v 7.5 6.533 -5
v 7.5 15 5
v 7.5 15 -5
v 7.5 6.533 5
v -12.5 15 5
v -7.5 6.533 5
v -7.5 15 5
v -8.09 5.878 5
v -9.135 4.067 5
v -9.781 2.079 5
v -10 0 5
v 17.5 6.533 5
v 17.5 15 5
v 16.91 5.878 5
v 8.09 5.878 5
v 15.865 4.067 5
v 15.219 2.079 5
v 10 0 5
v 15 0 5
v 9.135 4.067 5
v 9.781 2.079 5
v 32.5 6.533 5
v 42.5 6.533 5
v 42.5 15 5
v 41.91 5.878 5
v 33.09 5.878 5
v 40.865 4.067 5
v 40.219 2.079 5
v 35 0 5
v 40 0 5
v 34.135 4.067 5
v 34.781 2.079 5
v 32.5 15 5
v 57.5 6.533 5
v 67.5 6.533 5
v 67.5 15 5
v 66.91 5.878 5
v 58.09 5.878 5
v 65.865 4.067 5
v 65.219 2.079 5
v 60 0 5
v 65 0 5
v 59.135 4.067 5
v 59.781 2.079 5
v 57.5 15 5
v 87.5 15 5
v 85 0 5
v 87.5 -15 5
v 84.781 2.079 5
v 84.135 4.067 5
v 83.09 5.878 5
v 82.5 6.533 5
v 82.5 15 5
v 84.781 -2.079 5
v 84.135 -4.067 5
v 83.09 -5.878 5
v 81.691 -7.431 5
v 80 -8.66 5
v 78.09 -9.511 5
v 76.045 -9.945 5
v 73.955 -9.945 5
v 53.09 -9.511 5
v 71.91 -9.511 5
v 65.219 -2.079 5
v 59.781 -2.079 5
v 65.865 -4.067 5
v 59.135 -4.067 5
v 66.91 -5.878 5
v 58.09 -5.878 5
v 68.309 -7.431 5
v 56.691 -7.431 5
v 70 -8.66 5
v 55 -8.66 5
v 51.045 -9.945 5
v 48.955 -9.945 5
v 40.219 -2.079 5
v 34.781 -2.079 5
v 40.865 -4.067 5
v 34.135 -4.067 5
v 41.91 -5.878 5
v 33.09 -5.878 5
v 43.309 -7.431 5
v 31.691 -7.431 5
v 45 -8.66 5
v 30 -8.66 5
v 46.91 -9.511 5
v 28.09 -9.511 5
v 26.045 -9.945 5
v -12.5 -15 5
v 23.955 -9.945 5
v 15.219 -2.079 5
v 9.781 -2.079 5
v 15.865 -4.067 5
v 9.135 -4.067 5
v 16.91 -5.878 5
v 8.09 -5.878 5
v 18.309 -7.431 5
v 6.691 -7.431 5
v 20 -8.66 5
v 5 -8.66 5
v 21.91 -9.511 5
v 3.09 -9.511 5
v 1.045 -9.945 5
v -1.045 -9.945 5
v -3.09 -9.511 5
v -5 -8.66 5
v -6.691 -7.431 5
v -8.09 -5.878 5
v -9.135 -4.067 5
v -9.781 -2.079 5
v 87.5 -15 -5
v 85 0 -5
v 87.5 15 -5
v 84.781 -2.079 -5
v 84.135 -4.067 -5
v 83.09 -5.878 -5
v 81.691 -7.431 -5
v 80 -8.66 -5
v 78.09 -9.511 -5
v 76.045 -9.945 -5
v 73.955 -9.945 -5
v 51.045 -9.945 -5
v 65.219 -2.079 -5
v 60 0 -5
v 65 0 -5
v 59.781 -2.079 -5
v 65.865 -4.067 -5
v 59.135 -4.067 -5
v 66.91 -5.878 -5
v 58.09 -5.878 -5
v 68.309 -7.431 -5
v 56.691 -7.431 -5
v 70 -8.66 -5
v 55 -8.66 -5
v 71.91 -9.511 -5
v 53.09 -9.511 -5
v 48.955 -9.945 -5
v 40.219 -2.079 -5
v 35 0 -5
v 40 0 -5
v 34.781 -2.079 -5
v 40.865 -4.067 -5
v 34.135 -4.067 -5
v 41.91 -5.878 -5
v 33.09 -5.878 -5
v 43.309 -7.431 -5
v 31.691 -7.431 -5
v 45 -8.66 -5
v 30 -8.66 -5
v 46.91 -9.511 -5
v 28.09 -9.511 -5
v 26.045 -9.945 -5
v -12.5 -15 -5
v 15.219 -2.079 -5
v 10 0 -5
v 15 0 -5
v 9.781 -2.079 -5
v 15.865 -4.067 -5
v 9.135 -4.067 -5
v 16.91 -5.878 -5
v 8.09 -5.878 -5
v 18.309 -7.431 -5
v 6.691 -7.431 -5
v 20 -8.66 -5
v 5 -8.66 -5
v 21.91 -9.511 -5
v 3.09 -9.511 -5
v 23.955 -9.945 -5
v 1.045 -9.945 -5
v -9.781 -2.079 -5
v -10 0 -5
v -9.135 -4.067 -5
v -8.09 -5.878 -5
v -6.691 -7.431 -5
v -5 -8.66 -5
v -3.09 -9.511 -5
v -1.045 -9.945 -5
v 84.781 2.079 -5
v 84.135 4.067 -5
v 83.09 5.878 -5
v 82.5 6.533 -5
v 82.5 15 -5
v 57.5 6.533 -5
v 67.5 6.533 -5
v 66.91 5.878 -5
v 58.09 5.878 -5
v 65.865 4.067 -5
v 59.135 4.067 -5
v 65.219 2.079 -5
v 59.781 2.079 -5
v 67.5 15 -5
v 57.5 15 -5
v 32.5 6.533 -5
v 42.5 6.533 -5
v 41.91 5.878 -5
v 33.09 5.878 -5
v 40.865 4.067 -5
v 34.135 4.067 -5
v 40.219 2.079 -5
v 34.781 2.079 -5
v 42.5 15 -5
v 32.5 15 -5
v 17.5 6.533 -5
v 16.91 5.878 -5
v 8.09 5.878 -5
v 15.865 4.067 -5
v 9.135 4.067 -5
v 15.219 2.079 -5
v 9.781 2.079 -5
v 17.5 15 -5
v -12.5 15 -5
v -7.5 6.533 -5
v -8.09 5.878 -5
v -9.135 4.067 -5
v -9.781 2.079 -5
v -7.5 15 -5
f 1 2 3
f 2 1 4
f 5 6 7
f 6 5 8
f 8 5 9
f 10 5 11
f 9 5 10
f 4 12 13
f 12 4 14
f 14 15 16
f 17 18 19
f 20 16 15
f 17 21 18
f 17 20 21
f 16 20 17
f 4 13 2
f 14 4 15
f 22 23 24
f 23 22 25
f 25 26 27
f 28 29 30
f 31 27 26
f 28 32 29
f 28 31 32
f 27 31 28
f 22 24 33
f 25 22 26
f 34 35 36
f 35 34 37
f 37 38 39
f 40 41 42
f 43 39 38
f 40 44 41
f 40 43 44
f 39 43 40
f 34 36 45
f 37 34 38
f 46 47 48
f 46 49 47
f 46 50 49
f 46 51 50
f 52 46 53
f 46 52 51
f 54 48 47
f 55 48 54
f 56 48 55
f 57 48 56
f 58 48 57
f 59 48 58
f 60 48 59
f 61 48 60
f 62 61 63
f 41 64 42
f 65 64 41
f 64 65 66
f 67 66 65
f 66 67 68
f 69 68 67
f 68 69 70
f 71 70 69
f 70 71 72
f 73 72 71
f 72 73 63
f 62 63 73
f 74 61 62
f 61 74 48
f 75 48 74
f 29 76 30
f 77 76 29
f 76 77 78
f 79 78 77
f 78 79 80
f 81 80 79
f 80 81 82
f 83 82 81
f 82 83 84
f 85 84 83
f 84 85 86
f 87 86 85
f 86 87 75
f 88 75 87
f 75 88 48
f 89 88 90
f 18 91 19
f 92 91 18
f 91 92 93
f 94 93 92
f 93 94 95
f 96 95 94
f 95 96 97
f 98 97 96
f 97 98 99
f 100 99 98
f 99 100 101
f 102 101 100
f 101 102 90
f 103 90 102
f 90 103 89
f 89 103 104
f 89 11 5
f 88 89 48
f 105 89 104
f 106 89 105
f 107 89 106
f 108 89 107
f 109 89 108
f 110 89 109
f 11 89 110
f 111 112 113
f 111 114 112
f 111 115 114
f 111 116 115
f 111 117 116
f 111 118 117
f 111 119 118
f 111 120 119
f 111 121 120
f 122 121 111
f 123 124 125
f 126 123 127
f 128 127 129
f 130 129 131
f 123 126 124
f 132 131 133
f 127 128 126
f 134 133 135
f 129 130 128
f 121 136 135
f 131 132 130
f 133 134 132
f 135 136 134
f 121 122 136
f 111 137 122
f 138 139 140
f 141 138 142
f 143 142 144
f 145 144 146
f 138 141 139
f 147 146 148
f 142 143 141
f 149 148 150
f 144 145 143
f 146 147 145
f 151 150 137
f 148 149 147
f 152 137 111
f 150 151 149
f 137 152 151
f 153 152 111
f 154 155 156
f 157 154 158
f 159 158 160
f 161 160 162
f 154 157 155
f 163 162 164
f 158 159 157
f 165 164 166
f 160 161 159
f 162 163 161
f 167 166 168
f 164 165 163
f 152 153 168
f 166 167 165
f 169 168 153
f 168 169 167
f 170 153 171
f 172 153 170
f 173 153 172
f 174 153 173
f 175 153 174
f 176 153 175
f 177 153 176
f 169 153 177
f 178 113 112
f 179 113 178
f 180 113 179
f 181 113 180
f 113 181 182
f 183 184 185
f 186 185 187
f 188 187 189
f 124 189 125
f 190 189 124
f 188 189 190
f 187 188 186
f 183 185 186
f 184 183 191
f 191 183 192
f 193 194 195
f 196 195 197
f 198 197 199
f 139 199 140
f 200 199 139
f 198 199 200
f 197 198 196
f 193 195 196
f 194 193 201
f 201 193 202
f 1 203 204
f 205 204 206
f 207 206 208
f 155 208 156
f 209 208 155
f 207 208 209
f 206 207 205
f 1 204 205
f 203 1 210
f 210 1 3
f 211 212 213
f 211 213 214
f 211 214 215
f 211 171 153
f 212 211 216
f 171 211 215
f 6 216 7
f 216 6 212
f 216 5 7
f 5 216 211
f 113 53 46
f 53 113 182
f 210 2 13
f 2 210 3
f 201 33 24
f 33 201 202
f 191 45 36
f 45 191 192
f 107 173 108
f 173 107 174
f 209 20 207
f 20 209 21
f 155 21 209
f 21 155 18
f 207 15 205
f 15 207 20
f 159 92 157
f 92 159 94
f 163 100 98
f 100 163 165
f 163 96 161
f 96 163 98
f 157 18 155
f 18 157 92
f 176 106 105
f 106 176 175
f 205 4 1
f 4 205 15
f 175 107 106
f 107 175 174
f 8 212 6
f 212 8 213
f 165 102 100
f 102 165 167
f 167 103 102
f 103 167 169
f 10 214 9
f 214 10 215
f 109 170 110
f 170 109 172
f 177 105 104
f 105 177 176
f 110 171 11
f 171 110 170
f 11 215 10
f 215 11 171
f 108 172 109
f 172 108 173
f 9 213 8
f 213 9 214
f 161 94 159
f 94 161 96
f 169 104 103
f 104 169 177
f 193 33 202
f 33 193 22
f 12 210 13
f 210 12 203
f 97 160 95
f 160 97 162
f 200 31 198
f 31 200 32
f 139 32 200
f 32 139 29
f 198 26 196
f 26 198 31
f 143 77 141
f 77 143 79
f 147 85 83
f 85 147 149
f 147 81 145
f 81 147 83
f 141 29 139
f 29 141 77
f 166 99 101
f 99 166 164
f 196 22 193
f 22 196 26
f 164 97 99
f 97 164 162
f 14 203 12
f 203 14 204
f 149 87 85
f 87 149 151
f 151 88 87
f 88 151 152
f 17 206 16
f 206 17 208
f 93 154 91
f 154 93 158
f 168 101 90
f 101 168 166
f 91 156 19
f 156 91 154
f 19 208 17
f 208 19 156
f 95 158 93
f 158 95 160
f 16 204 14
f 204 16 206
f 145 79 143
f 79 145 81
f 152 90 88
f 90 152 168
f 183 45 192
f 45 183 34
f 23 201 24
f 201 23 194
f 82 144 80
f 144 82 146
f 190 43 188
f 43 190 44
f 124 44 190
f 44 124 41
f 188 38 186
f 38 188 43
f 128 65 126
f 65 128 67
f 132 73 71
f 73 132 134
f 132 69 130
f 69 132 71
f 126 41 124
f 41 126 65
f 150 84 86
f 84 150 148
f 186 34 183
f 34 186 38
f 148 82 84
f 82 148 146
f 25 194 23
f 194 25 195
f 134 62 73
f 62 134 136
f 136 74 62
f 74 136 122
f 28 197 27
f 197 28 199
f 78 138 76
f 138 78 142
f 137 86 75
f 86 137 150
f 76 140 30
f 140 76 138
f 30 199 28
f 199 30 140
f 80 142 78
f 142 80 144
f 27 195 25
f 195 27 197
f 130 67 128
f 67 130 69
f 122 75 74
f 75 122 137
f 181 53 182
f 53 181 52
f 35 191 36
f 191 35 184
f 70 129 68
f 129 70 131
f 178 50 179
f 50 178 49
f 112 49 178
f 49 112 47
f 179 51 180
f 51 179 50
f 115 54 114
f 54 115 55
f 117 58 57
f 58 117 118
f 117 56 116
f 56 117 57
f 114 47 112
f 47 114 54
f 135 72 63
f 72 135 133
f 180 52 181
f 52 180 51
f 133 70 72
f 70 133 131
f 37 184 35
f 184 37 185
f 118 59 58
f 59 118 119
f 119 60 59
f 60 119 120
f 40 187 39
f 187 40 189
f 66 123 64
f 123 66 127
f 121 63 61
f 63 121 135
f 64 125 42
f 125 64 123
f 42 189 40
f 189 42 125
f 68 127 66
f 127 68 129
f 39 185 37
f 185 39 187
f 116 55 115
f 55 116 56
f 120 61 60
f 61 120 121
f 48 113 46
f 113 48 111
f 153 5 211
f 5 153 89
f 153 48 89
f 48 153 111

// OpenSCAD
thickness = 10;

toe_rad=10;
toe_sep=5;

depth=toe_rad*2+toe_sep*2;
length = 8*toe_rad + 4*toe_sep;
difference() {
    translate ([3 * length / 8, 0, 0])
    cube([length, depth, thickness], center=true);
for (i = [0:3])
    translate([i * length / 4, 0, 0])
        union() {
            translate([0, depth/4, 0])
                cube ([depth/2,depth/2,thickness], center=true);
            cylinder(thickness, toe_rad, toe_rad, center=true);
        }
}
